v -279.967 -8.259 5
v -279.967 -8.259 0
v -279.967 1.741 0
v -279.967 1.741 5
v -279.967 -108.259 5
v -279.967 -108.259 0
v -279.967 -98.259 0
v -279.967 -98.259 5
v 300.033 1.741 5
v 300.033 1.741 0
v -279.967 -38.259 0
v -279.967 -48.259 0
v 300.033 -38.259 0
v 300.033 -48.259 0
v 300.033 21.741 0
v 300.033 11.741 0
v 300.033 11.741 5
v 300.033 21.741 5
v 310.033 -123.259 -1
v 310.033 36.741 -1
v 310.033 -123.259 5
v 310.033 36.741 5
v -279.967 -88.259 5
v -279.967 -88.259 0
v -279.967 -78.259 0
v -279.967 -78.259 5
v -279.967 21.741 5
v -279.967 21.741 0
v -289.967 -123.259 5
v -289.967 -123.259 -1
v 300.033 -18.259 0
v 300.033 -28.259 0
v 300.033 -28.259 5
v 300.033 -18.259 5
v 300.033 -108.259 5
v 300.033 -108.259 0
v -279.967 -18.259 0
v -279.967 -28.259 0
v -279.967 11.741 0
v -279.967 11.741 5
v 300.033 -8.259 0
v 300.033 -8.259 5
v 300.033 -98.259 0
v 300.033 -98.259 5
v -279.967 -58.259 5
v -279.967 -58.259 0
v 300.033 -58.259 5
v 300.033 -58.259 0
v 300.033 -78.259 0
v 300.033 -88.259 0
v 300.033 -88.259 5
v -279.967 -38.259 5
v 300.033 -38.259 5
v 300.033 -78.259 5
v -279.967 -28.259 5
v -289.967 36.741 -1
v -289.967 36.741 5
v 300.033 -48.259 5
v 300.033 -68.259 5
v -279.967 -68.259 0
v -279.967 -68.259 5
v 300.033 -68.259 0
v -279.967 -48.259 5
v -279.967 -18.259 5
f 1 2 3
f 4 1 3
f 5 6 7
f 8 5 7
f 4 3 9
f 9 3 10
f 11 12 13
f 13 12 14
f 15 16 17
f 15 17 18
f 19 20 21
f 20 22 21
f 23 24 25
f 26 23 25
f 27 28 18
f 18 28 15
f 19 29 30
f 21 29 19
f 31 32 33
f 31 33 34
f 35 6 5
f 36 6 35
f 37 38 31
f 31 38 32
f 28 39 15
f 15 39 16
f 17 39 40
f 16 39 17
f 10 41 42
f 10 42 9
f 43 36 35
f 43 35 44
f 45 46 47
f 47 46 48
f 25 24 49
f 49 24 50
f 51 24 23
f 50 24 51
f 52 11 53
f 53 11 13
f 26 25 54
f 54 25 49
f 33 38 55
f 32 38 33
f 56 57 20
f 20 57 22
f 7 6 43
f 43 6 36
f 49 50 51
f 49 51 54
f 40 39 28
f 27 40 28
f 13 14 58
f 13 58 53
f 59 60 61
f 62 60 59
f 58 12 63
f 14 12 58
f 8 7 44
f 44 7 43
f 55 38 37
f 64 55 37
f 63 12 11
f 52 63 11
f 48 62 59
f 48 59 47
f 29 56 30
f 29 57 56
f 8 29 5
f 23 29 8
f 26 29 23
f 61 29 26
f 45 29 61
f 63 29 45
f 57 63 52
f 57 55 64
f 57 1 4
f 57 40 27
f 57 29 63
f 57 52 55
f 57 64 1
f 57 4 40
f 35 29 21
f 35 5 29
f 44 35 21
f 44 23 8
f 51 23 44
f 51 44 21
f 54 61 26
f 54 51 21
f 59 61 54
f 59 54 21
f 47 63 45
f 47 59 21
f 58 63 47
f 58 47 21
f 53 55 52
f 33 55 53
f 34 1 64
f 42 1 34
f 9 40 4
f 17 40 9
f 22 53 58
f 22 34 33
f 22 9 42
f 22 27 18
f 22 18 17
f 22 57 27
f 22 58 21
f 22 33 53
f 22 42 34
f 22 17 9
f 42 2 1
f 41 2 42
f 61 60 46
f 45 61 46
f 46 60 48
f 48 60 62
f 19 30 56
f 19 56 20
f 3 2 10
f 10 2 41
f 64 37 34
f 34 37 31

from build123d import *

# Parameters (mm, degrees)
F0_W     = 600
F0_H     = 160
F0_W_2   = 580
F0_H_2   = 10
F1_DEPTH = 5
F2_W     = 600
F2_H     = 160
F3_DEPTH = 1


with BuildPart() as f1:
    # F0 (on Top) → F1 (new body)
    with BuildSketch(Plane.XY):
        with Locations((10.033467, -43.259316)):
            Rectangle(F0_W, F0_H)
        with Locations((10.033467, -103.259316)):
            Rectangle(F0_W_2, F0_H_2, mode=Mode.SUBTRACT)
        with Locations((10.033467, -83.259316)):
            Rectangle(F0_W_2, F0_H_2, mode=Mode.SUBTRACT)
        with Locations((10.033467, -63.259316)):
            Rectangle(F0_W_2, F0_H_2, mode=Mode.SUBTRACT)
        with Locations((10.033467, -43.259316)):
            Rectangle(F0_W_2, F0_H_2, mode=Mode.SUBTRACT)
        with Locations((10.033467, -23.259316)):
            Rectangle(F0_W_2, F0_H_2, mode=Mode.SUBTRACT)
        with Locations((10.033467, -3.259316)):
            Rectangle(F0_W_2, F0_H_2, mode=Mode.SUBTRACT)
        with Locations((10.033467, 16.740684)):
            Rectangle(F0_W_2, F0_H_2, mode=Mode.SUBTRACT)
    extrude(amount=F1_DEPTH)

    # F2 (on face) → F3 (join)
    with BuildSketch(Plane(origin=(0, 0, 0), x_dir=(1, 0, 0), z_dir=(0, 0, -1))):
        with Locations((10.033467, 43.259316)):
            Rectangle(F2_W, F2_H)
    extrude(amount=F3_DEPTH)


solid = f1.part
